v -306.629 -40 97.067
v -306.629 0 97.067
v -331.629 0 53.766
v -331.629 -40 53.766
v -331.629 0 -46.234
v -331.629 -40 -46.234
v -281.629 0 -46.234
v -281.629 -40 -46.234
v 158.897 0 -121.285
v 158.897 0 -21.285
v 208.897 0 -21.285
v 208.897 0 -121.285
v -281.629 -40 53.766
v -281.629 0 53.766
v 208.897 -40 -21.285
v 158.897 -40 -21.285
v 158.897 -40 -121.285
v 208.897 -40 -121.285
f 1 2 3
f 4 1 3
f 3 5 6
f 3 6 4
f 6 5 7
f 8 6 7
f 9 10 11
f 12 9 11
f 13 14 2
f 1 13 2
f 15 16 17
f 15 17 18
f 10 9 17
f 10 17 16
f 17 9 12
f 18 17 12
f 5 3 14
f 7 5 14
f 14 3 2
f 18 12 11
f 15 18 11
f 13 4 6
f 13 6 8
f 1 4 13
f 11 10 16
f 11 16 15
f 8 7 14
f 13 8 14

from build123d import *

# Parameters (mm, degrees)
F0_W     = 50
F0_H     = 100
F1_DEPTH = 40
F2_W     = 50
F2_H     = 100
F3_DEPTH = 40


with BuildPart() as f1:
    # F0 (on Front) → F1 (new body)
    with BuildSketch(Plane.XZ):
        with Locations((-306.628928, 3.766021)):
            Rectangle(F0_W, F0_H)
        Polygon((-306.628928, 97.067291), (-331.628928, 53.766021), (-281.628928, 53.766021), align=None)
    extrude(amount=F1_DEPTH)


with BuildPart() as f3:
    # F2 (on Front) → F3 (new body)
    with BuildSketch(Plane.XZ):
        with Locations((183.896723, -71.285395)):
            Rectangle(F2_W, F2_H)
    extrude(amount=F3_DEPTH)


solid = Compound([f1.part, f3.part])
